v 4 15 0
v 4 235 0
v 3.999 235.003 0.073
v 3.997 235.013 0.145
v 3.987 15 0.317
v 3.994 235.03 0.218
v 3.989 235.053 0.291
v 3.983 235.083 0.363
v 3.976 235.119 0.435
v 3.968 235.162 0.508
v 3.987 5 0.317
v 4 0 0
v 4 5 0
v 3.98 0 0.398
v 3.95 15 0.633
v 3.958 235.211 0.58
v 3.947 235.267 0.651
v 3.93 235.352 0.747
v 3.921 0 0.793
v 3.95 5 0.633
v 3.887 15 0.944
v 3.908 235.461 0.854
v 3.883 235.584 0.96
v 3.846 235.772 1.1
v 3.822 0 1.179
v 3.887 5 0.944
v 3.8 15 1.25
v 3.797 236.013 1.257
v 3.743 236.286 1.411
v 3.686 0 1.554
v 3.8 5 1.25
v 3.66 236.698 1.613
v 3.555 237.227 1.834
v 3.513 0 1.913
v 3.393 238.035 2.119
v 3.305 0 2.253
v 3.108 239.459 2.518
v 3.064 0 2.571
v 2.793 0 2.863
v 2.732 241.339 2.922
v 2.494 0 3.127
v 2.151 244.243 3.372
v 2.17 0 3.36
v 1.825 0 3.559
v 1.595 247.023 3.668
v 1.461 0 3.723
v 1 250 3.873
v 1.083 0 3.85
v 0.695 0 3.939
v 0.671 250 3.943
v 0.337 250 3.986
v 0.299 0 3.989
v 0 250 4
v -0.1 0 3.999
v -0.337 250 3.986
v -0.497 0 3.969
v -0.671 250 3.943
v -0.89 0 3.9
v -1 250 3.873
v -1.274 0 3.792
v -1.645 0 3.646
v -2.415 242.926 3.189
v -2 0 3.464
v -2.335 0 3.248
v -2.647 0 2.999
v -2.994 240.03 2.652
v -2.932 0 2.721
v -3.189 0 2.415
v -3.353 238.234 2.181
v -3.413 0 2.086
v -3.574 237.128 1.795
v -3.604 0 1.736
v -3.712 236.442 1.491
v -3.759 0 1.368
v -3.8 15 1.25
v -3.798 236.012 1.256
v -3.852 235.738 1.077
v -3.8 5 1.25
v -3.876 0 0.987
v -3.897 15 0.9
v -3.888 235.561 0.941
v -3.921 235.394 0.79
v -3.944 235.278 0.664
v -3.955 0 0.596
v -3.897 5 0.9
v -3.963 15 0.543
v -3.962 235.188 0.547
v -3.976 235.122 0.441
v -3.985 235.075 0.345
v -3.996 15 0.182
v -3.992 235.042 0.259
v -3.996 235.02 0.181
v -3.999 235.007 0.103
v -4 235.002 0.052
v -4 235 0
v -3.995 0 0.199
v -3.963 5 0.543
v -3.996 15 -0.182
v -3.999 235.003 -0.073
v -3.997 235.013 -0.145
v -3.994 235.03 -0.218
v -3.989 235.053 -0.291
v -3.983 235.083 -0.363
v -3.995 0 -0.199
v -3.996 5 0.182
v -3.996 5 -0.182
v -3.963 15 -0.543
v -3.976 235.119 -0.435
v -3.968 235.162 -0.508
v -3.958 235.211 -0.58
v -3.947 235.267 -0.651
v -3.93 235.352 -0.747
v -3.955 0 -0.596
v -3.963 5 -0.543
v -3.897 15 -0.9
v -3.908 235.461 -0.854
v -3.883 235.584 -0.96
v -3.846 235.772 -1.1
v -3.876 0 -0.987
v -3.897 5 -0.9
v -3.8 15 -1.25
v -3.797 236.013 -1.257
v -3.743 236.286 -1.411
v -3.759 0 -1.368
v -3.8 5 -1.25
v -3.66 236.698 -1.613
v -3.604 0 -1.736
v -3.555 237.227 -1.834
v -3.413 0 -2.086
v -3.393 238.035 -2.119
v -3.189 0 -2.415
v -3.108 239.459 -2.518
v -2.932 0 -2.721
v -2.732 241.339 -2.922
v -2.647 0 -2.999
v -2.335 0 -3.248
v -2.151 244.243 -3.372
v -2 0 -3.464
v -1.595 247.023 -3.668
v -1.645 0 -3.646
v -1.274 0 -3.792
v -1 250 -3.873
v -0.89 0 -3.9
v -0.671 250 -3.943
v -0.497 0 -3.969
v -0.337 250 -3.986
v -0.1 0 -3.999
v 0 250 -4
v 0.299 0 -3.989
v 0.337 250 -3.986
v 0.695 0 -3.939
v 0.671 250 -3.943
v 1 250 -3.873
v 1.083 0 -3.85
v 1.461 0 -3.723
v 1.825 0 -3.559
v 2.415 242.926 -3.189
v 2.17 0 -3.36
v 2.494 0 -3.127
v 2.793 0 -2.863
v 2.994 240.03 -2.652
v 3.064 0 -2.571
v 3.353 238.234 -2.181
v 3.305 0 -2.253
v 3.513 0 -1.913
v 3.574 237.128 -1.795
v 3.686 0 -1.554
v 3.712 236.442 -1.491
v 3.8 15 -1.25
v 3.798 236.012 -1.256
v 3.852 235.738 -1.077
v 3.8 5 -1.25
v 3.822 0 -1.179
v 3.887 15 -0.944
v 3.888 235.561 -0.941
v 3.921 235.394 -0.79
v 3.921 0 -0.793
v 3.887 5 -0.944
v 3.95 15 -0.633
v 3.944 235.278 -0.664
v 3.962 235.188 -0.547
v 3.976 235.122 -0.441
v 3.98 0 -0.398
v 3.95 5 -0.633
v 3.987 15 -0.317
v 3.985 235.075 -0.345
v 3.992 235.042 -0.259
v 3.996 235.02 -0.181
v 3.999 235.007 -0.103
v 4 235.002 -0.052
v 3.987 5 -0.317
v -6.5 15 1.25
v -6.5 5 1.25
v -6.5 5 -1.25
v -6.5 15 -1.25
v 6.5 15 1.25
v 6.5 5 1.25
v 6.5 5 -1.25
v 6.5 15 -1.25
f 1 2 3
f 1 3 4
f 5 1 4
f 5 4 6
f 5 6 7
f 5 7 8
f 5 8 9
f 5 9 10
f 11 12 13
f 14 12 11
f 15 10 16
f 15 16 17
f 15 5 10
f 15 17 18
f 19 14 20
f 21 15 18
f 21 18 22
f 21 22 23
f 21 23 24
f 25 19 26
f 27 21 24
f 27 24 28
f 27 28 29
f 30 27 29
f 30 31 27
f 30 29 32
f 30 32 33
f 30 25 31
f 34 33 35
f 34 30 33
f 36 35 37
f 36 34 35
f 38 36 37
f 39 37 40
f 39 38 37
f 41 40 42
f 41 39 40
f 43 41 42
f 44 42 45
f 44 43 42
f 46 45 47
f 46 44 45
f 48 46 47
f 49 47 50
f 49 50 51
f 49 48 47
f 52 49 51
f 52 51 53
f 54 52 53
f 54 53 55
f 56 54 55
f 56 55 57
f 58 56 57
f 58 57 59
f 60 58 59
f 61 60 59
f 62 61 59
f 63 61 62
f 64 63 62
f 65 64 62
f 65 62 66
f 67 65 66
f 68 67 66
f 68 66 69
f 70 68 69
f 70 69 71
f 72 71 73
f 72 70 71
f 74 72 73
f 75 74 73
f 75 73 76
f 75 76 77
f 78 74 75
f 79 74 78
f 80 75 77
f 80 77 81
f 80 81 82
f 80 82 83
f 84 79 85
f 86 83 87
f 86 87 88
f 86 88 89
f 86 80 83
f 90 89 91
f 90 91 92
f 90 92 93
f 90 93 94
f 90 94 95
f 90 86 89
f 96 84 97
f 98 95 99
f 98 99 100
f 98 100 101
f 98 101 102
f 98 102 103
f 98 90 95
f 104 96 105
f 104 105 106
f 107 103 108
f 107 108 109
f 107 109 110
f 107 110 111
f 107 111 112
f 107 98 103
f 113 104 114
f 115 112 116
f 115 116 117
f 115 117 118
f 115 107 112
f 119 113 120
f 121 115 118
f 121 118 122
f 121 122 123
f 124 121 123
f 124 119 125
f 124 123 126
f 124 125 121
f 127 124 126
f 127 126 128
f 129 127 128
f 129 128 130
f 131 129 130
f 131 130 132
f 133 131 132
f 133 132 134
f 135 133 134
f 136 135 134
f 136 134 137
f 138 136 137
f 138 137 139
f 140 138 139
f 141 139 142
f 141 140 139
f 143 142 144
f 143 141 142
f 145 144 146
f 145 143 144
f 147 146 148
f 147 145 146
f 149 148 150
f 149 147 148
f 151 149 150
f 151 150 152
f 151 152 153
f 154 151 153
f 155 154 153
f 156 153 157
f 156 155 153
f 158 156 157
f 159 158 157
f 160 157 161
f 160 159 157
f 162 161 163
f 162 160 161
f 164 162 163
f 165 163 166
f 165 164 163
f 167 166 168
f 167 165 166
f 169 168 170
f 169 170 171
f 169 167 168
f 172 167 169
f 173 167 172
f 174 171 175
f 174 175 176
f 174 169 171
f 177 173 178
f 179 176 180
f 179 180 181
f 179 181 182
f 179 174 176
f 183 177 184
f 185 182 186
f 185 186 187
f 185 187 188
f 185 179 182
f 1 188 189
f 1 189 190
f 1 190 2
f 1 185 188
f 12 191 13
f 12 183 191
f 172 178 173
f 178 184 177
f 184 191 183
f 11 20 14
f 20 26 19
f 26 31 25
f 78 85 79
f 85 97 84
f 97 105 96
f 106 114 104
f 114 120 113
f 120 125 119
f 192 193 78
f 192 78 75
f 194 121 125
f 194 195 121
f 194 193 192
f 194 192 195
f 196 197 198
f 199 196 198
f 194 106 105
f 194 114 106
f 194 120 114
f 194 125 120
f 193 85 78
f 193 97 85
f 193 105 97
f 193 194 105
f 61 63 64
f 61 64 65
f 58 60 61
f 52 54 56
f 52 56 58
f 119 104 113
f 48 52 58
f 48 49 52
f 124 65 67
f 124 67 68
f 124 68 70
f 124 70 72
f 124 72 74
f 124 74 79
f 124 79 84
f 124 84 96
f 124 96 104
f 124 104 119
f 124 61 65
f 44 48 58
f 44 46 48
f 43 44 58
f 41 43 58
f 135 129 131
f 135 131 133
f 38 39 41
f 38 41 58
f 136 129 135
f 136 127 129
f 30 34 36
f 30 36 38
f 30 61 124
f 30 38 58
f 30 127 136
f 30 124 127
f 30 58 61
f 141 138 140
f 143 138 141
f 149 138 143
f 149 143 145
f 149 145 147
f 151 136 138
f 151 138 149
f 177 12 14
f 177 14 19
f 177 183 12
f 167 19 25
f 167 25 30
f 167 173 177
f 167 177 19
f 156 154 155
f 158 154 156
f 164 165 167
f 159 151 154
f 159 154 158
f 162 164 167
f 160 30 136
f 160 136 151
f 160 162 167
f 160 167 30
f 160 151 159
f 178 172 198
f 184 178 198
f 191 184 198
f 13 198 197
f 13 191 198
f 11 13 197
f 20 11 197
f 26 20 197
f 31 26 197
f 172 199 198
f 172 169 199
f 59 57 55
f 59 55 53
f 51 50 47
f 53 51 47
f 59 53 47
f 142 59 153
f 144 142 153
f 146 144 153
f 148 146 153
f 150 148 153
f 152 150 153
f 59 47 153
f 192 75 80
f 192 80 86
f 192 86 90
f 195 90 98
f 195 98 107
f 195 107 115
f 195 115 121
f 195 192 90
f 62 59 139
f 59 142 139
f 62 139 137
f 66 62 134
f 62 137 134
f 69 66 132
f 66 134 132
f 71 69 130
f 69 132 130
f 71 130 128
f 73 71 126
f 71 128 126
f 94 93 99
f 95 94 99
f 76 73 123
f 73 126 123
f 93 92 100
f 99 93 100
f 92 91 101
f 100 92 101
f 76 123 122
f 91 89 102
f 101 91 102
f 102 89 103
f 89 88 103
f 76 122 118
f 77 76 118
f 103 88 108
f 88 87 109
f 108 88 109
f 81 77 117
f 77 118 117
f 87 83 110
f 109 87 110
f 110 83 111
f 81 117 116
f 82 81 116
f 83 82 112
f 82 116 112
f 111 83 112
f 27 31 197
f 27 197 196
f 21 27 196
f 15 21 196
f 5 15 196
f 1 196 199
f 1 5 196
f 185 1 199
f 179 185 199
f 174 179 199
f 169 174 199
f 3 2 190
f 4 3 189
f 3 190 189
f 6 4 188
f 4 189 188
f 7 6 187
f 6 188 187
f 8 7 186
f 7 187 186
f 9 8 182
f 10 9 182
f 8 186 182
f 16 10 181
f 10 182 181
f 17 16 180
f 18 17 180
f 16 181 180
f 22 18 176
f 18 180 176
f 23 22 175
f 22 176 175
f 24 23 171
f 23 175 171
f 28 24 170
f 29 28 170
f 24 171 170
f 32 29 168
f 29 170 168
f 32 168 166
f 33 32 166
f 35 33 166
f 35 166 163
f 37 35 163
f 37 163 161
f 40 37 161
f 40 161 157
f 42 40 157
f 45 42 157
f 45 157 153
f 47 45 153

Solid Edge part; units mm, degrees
sketch "Sketch1" plane through (0, 0, 0) normal (0, -1, 0) x (1, 0, 0)
  circle A0 centre (0, 0) radius 4
  dimension "D1" = 8
extrude "Protrusion1" add sketch "Sketch1" against normal blind 250
sketch "Sketch2" plane through (0, 0, 0) normal (0, 0, 1) x (1, 0, 0)
  line L0 (4, 250) -> (4, 235)
  line L1 (4, 235) -> (1, 250)
  line L2 (1, 250) -> (4, 250)
  dimension "D1" = 15
  dimension "D2" = 3
extrude "拉伸除料_1" cut sketch "Sketch2" along normal mid plane 43.1543
mirror "Mirror1" about plane through (0, 0, 0) normal (1, 0, 0) of "拉伸除料_1"
sketch "Sketch3" plane through (0, 0, 0) normal (1, 0, 0) x (0, 1, 0)
  line L0 (15, -1.25) -> (5, -1.25)
  line L1 (5, -1.25) -> (5, 1.25)
  line L2 (5, 1.25) -> (15, 1.25)
  line L3 (15, 1.25) -> (15, -1.25)
extrude "拉伸_2" add sketch "Sketch3" along normal mid plane 13
